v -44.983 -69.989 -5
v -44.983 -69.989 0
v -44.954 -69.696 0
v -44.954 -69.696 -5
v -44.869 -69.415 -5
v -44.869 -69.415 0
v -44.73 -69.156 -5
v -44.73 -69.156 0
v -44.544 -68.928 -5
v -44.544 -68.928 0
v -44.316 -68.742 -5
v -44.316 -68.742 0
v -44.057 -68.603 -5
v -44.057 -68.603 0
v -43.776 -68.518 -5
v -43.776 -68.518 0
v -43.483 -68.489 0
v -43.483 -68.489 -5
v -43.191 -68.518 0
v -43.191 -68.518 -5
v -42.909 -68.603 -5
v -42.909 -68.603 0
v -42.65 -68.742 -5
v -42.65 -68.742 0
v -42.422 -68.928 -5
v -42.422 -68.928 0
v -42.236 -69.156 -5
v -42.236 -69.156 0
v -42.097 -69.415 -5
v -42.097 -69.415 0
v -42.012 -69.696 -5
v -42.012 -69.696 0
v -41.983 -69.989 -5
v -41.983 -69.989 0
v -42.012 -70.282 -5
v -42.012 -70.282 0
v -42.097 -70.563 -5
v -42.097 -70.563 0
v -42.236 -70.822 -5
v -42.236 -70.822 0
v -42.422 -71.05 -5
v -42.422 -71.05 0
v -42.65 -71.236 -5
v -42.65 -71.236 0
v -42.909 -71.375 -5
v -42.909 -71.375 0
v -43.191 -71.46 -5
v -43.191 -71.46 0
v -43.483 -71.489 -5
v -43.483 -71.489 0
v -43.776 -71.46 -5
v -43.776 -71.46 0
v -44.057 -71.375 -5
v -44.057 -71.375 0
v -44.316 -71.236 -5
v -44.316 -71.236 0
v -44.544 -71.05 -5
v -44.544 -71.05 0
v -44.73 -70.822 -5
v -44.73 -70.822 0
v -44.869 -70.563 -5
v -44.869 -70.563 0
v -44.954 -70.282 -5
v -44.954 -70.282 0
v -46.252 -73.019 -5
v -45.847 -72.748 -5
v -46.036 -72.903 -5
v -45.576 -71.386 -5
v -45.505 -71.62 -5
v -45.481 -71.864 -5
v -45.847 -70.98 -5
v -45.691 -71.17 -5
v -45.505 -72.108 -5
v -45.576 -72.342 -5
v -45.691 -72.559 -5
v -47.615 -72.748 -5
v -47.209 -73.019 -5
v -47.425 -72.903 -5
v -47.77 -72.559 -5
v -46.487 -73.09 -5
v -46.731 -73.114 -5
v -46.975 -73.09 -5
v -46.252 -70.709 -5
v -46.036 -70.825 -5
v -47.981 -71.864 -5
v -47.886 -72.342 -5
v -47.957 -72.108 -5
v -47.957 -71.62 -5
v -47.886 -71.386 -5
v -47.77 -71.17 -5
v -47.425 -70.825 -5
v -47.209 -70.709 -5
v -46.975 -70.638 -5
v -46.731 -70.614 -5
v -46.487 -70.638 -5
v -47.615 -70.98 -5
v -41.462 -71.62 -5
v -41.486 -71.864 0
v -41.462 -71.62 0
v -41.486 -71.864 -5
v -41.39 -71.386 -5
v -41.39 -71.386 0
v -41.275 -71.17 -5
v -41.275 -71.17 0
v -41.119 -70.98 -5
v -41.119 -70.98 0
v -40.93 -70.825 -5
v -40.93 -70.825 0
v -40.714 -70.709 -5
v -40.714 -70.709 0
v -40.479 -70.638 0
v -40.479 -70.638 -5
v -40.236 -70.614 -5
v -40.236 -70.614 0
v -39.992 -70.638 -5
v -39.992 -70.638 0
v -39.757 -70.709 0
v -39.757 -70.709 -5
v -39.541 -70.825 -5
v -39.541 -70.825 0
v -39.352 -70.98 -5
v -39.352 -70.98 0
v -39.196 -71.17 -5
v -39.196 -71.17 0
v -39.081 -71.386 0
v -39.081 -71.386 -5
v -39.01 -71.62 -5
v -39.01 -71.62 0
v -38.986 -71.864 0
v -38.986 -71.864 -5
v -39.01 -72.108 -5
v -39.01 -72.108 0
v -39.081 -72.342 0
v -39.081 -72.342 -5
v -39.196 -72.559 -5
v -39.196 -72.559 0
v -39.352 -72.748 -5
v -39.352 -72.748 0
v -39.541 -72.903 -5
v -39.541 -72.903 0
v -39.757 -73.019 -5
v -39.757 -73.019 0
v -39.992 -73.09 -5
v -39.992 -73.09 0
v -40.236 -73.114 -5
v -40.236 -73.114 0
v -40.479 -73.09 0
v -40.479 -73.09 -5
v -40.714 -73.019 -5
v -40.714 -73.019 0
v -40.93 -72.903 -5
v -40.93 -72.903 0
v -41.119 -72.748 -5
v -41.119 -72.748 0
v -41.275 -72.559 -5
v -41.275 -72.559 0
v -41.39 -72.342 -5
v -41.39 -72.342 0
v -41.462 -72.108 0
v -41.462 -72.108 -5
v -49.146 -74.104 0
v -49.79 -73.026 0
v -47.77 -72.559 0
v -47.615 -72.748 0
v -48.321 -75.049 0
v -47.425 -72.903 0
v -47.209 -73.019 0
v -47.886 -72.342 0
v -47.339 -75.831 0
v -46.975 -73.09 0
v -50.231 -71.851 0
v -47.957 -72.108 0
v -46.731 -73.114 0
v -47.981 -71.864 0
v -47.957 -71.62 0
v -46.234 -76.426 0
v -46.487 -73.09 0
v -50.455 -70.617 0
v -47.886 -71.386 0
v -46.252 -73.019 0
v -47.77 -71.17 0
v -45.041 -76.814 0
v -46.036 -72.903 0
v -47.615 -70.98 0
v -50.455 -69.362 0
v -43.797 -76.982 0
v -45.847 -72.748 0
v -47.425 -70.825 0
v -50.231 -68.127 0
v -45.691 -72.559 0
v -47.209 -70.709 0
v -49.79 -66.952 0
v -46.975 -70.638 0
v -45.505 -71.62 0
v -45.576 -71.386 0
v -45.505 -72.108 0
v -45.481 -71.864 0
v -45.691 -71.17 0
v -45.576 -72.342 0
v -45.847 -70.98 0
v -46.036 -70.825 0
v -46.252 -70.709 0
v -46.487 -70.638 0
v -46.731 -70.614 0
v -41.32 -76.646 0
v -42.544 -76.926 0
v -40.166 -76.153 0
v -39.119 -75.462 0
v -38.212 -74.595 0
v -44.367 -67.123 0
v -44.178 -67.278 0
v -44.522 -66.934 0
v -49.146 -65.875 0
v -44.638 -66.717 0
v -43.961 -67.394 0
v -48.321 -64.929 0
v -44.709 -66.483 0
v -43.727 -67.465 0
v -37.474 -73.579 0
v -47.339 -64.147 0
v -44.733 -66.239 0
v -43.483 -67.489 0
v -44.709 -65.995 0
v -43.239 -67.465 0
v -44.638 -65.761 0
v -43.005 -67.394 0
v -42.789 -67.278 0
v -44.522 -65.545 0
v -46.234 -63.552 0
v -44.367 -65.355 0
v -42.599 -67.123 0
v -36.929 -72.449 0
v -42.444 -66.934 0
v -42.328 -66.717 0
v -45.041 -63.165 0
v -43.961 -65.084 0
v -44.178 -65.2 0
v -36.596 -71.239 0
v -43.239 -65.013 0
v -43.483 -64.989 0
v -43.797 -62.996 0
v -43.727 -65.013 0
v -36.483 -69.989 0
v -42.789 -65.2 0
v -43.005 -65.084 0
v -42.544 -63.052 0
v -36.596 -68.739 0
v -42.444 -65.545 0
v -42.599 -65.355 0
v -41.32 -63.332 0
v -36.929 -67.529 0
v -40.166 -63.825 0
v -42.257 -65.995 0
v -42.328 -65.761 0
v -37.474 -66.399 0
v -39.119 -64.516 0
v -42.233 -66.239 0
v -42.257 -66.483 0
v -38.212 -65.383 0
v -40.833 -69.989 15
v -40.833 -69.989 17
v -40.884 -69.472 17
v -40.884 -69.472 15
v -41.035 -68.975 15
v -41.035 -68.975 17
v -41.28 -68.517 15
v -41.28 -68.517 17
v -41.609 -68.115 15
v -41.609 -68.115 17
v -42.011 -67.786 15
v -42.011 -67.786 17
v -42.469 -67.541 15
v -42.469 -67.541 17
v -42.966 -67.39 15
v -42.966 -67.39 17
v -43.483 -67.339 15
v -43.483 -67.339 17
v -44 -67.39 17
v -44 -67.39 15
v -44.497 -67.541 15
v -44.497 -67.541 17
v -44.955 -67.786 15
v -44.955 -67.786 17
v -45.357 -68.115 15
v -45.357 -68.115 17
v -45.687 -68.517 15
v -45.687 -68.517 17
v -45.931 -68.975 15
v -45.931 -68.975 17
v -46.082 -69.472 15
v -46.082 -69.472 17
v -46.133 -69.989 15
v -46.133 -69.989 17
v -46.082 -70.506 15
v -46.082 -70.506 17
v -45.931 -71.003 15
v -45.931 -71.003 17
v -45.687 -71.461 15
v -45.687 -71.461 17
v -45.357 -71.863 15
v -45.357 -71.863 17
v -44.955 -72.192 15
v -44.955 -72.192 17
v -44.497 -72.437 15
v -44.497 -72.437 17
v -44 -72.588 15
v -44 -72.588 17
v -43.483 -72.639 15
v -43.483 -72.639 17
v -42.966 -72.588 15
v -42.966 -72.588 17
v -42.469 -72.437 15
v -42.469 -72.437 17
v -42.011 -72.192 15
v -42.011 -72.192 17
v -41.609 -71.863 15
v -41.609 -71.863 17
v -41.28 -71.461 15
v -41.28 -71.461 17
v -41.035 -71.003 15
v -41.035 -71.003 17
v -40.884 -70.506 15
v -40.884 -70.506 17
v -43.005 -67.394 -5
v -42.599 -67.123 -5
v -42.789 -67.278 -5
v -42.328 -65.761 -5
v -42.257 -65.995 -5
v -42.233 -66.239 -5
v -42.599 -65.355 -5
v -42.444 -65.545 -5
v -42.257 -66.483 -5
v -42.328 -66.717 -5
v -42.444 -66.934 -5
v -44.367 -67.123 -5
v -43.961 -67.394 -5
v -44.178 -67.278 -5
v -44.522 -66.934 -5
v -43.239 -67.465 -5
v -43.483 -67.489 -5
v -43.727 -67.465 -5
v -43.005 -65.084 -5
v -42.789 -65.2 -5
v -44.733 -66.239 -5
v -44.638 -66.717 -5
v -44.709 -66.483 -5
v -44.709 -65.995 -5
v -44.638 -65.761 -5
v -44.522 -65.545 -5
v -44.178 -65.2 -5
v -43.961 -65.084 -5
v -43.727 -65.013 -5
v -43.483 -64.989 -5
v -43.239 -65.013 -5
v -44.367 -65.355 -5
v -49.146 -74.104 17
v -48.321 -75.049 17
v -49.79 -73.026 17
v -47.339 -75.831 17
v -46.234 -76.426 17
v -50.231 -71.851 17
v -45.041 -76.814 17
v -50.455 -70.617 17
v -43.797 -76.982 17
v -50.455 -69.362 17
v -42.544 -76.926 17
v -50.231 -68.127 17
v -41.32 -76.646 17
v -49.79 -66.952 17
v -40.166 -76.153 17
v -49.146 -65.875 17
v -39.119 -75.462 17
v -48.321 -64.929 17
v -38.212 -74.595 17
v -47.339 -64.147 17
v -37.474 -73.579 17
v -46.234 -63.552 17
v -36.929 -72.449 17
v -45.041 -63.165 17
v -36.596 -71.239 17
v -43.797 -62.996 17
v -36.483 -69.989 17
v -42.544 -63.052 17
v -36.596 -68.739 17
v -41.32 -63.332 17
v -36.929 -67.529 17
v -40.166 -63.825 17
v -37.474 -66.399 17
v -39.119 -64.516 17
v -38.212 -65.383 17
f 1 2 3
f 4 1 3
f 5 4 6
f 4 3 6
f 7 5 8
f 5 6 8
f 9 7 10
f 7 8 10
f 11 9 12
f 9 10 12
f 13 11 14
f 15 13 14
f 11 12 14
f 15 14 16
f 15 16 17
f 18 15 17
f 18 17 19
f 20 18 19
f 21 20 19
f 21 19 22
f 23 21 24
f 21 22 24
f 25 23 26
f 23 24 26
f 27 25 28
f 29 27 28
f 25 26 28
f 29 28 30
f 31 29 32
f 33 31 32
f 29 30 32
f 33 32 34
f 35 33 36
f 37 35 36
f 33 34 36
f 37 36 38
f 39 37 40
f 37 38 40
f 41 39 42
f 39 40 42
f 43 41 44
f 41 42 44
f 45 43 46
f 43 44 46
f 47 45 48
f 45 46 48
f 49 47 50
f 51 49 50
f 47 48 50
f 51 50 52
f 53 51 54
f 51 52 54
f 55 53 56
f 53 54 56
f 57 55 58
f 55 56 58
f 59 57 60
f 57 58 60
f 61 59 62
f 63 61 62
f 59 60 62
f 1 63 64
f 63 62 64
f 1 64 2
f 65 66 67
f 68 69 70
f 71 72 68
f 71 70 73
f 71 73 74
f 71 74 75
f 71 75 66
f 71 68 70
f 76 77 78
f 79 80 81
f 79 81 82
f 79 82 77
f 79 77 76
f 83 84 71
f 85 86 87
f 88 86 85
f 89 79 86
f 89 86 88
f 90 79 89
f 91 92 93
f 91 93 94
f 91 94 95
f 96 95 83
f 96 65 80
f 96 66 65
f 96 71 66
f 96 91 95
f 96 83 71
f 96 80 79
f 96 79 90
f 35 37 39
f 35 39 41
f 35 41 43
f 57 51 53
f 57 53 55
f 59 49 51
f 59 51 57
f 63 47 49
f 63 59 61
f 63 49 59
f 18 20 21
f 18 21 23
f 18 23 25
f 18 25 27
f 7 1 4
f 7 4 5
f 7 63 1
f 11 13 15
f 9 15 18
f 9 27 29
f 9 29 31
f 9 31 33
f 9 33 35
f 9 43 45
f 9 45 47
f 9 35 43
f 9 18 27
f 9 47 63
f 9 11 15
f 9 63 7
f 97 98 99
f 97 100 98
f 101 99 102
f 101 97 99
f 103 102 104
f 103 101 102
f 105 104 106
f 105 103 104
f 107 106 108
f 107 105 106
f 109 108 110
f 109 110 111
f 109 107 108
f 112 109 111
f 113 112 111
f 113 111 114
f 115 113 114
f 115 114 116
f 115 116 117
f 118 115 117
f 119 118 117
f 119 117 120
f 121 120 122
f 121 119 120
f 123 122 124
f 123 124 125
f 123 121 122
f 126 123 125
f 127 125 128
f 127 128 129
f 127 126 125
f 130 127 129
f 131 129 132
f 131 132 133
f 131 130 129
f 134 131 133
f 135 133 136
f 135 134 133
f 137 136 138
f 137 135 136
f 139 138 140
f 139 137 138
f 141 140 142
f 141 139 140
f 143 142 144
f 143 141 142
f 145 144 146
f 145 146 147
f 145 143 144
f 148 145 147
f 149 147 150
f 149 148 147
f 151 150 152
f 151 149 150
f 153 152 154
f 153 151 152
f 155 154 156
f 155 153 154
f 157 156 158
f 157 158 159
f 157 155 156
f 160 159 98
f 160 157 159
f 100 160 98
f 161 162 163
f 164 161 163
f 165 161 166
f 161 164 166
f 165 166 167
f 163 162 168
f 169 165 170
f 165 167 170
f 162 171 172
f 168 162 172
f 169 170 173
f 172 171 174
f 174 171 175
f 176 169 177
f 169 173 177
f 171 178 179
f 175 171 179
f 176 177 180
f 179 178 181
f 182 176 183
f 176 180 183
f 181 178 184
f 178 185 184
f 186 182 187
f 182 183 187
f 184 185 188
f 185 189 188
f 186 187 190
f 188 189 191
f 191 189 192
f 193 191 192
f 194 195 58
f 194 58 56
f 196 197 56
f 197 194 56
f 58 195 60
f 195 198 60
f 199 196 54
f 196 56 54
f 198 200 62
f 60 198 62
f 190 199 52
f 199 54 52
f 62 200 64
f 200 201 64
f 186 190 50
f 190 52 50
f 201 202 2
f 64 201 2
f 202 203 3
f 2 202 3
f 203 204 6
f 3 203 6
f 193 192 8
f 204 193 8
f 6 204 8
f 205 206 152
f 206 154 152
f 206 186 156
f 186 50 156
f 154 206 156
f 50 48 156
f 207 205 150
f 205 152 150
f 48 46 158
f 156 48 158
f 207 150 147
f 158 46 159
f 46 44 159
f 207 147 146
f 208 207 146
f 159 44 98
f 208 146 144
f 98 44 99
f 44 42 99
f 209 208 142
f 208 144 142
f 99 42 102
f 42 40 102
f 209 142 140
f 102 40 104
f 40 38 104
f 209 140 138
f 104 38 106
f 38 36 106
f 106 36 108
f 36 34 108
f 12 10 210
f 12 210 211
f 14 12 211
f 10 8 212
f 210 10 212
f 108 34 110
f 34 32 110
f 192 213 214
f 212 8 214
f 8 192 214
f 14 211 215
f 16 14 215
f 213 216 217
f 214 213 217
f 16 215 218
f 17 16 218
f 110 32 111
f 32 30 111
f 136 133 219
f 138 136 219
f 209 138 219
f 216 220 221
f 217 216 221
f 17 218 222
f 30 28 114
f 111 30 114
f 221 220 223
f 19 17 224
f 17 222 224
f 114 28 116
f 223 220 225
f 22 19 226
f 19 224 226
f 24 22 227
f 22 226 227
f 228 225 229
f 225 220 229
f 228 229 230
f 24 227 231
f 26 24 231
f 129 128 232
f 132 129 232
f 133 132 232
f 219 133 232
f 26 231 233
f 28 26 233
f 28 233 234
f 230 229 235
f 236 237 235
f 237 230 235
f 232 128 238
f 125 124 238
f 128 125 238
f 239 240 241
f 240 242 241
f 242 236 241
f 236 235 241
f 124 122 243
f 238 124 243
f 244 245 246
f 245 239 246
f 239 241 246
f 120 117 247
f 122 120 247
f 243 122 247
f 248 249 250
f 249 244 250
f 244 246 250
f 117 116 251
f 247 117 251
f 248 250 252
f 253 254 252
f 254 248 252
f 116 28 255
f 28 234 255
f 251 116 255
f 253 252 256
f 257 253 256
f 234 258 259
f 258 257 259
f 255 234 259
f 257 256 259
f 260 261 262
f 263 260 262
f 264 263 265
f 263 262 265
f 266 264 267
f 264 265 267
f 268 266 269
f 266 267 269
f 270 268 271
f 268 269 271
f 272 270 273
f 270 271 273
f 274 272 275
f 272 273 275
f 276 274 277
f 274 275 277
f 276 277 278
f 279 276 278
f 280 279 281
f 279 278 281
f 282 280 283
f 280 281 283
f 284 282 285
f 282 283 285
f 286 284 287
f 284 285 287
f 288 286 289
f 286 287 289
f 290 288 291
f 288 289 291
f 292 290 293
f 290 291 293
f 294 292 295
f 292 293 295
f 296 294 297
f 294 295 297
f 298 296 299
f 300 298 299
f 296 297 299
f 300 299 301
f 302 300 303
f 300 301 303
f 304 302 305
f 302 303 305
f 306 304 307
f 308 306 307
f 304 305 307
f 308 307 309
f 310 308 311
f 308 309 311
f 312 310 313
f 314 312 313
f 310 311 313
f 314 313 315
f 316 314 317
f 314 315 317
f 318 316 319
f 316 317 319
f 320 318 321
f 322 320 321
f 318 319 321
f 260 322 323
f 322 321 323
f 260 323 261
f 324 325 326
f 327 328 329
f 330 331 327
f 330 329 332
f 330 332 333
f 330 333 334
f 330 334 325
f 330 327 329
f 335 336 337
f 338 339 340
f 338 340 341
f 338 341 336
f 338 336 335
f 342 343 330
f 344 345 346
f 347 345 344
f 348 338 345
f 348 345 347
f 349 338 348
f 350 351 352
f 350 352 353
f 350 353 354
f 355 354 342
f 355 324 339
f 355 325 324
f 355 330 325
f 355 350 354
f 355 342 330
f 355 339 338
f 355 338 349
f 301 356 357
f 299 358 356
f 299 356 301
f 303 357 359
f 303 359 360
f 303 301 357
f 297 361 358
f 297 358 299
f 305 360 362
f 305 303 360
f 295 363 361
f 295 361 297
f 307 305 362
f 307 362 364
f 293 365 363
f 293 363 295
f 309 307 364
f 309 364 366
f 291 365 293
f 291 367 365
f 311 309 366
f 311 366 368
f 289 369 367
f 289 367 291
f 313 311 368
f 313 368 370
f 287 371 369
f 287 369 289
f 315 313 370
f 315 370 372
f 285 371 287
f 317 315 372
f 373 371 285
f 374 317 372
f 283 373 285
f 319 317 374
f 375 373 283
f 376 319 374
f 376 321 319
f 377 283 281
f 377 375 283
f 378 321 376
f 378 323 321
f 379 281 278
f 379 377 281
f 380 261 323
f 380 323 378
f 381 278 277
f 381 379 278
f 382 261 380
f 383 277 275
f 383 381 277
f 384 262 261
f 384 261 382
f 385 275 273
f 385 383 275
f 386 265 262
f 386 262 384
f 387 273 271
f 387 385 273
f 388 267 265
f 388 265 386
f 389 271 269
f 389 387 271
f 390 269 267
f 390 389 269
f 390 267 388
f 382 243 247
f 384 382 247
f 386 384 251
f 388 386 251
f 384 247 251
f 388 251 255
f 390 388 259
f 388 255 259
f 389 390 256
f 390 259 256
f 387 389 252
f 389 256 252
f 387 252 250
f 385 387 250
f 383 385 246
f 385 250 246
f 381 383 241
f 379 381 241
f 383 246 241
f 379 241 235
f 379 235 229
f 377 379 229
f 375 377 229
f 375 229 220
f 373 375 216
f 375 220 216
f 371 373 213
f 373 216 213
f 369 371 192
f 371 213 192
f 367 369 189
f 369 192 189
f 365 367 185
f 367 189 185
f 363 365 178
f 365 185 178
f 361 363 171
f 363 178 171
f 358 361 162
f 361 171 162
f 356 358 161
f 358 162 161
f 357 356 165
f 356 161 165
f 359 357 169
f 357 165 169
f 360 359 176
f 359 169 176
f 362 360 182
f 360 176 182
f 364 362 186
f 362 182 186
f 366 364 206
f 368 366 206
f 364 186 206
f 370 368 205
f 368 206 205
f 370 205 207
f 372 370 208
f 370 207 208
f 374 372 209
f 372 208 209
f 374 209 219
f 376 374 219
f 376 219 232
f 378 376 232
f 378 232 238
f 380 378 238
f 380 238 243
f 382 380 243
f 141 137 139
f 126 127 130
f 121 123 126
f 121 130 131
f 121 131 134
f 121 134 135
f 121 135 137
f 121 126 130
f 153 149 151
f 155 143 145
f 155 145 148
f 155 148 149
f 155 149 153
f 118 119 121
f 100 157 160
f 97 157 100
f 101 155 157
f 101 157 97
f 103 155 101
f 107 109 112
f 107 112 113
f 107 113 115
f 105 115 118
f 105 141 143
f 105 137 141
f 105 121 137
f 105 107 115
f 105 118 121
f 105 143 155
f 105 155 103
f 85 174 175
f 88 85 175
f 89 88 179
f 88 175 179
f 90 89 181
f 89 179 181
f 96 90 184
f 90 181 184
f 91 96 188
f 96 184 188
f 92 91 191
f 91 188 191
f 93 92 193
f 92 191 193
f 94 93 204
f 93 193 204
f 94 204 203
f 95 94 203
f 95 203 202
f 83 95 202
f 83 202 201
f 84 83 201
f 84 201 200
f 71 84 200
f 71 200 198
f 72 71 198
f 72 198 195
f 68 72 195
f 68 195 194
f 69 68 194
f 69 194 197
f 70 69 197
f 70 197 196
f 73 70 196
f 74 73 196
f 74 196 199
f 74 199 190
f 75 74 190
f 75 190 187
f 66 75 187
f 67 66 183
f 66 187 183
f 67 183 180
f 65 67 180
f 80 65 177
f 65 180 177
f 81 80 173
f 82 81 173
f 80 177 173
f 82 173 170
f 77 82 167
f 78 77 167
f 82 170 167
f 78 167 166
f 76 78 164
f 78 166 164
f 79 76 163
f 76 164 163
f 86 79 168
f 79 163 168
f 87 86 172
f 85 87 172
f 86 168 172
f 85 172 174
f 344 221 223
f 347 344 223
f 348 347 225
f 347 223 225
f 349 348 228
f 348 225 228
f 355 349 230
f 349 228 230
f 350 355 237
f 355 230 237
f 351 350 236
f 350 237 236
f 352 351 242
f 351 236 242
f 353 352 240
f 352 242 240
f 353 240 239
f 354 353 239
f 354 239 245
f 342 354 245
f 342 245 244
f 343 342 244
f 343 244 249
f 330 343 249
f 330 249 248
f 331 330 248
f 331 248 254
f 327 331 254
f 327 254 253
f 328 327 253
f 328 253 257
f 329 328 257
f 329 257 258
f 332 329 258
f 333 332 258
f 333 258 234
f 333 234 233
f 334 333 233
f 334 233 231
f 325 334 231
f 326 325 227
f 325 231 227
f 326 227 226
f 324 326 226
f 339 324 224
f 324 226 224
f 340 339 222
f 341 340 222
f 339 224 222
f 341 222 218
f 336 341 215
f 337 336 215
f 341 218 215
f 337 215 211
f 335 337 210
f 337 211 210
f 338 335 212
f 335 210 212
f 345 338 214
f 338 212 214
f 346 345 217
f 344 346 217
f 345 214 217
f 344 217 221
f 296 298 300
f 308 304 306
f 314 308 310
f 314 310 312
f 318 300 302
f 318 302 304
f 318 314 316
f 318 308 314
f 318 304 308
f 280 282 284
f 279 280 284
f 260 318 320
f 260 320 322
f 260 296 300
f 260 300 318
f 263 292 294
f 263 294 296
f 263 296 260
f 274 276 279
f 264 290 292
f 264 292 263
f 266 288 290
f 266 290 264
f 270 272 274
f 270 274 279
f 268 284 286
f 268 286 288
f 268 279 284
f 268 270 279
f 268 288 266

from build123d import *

# Parameters (mm, degrees)
SKETCH1_R           = 7
SKETCH1_R_2         = 1.25
BOSS_EXTRUDE1_DEPTH = 17
SKETCH2_R           = 7
BOSS_EXTRUDE2_DEPTH = 11
SKETCH3_R           = 2.65
CUT_EXTRUDE1_DEPTH  = 2
SKETCH4_R           = 1.5
BOSS_EXTRUDE3_DEPTH = 5
SKETCH5_R           = 1.25
BOSS_EXTRUDE4_DEPTH = 5
SKETCH6_R           = 7
BOSS_EXTRUDE5_DEPTH = 15


with BuildPart() as part:
    # Sketch1 → Boss-Extrude1 (new body)
    with BuildSketch(Plane.XY):
        with Locations((-43.483141232, -69.989052064)):
            Circle(SKETCH1_R)
        with Locations((-43.483141232, -66.239052064)):
            Circle(SKETCH1_R_2, mode=Mode.SUBTRACT)
        with Locations((-40.235545968, -71.864052064)):
            Circle(SKETCH1_R_2, mode=Mode.SUBTRACT)
        with Locations((-46.730736496, -71.864052064)):
            Circle(SKETCH1_R_2, mode=Mode.SUBTRACT)
    extrude(amount=BOSS_EXTRUDE1_DEPTH)

    # Sketch2 → Boss-Extrude2 (add)
    with BuildSketch(Plane.XY.offset(17)):
        with Locations((-43.483141232, -69.989052064)):
            Circle(SKETCH2_R)
    extrude(amount=-BOSS_EXTRUDE2_DEPTH)

    # Sketch3 → Cut-Extrude1 (cut)
    with BuildSketch(Plane.XY.offset(17)):
        with Locations((-43.483141232, -69.989052064)):
            Circle(SKETCH3_R)
    extrude(amount=-CUT_EXTRUDE1_DEPTH, mode=Mode.SUBTRACT)

    # Sketch4 → Boss-Extrude3 (add)
    with BuildSketch(Plane(origin=(0, 0, 0), x_dir=(-1, 0, 0), z_dir=(0, 0, -1))):
        with Locations((43.483141232, -69.989052064)):
            Circle(SKETCH4_R)
    extrude(amount=BOSS_EXTRUDE3_DEPTH)

    # Sketch5 → Boss-Extrude4 (add, symmetric)
    with BuildSketch(Plane(origin=(0, 0, 0), x_dir=(-1, 0, 0), z_dir=(0, 0, -1))):
        with Locations((43.483141232, -66.239052064)):
            Circle(SKETCH5_R)
        with Locations((46.730736496, -71.864052064)):
            Circle(SKETCH5_R)
        with Locations((40.235545968, -71.864052064)):
            Circle(SKETCH5_R)
    extrude(amount=BOSS_EXTRUDE4_DEPTH, both=True)

    # Sketch6 → Boss-Extrude5 (add)
    with BuildSketch(Plane(origin=(0, 0, 0), x_dir=(-1, 0, 0), z_dir=(0, 0, -1))):
        with Locations((43.483141232, -69.989052064)):
            Circle(SKETCH6_R)
    extrude(amount=-BOSS_EXTRUDE5_DEPTH)


solid = part.part
